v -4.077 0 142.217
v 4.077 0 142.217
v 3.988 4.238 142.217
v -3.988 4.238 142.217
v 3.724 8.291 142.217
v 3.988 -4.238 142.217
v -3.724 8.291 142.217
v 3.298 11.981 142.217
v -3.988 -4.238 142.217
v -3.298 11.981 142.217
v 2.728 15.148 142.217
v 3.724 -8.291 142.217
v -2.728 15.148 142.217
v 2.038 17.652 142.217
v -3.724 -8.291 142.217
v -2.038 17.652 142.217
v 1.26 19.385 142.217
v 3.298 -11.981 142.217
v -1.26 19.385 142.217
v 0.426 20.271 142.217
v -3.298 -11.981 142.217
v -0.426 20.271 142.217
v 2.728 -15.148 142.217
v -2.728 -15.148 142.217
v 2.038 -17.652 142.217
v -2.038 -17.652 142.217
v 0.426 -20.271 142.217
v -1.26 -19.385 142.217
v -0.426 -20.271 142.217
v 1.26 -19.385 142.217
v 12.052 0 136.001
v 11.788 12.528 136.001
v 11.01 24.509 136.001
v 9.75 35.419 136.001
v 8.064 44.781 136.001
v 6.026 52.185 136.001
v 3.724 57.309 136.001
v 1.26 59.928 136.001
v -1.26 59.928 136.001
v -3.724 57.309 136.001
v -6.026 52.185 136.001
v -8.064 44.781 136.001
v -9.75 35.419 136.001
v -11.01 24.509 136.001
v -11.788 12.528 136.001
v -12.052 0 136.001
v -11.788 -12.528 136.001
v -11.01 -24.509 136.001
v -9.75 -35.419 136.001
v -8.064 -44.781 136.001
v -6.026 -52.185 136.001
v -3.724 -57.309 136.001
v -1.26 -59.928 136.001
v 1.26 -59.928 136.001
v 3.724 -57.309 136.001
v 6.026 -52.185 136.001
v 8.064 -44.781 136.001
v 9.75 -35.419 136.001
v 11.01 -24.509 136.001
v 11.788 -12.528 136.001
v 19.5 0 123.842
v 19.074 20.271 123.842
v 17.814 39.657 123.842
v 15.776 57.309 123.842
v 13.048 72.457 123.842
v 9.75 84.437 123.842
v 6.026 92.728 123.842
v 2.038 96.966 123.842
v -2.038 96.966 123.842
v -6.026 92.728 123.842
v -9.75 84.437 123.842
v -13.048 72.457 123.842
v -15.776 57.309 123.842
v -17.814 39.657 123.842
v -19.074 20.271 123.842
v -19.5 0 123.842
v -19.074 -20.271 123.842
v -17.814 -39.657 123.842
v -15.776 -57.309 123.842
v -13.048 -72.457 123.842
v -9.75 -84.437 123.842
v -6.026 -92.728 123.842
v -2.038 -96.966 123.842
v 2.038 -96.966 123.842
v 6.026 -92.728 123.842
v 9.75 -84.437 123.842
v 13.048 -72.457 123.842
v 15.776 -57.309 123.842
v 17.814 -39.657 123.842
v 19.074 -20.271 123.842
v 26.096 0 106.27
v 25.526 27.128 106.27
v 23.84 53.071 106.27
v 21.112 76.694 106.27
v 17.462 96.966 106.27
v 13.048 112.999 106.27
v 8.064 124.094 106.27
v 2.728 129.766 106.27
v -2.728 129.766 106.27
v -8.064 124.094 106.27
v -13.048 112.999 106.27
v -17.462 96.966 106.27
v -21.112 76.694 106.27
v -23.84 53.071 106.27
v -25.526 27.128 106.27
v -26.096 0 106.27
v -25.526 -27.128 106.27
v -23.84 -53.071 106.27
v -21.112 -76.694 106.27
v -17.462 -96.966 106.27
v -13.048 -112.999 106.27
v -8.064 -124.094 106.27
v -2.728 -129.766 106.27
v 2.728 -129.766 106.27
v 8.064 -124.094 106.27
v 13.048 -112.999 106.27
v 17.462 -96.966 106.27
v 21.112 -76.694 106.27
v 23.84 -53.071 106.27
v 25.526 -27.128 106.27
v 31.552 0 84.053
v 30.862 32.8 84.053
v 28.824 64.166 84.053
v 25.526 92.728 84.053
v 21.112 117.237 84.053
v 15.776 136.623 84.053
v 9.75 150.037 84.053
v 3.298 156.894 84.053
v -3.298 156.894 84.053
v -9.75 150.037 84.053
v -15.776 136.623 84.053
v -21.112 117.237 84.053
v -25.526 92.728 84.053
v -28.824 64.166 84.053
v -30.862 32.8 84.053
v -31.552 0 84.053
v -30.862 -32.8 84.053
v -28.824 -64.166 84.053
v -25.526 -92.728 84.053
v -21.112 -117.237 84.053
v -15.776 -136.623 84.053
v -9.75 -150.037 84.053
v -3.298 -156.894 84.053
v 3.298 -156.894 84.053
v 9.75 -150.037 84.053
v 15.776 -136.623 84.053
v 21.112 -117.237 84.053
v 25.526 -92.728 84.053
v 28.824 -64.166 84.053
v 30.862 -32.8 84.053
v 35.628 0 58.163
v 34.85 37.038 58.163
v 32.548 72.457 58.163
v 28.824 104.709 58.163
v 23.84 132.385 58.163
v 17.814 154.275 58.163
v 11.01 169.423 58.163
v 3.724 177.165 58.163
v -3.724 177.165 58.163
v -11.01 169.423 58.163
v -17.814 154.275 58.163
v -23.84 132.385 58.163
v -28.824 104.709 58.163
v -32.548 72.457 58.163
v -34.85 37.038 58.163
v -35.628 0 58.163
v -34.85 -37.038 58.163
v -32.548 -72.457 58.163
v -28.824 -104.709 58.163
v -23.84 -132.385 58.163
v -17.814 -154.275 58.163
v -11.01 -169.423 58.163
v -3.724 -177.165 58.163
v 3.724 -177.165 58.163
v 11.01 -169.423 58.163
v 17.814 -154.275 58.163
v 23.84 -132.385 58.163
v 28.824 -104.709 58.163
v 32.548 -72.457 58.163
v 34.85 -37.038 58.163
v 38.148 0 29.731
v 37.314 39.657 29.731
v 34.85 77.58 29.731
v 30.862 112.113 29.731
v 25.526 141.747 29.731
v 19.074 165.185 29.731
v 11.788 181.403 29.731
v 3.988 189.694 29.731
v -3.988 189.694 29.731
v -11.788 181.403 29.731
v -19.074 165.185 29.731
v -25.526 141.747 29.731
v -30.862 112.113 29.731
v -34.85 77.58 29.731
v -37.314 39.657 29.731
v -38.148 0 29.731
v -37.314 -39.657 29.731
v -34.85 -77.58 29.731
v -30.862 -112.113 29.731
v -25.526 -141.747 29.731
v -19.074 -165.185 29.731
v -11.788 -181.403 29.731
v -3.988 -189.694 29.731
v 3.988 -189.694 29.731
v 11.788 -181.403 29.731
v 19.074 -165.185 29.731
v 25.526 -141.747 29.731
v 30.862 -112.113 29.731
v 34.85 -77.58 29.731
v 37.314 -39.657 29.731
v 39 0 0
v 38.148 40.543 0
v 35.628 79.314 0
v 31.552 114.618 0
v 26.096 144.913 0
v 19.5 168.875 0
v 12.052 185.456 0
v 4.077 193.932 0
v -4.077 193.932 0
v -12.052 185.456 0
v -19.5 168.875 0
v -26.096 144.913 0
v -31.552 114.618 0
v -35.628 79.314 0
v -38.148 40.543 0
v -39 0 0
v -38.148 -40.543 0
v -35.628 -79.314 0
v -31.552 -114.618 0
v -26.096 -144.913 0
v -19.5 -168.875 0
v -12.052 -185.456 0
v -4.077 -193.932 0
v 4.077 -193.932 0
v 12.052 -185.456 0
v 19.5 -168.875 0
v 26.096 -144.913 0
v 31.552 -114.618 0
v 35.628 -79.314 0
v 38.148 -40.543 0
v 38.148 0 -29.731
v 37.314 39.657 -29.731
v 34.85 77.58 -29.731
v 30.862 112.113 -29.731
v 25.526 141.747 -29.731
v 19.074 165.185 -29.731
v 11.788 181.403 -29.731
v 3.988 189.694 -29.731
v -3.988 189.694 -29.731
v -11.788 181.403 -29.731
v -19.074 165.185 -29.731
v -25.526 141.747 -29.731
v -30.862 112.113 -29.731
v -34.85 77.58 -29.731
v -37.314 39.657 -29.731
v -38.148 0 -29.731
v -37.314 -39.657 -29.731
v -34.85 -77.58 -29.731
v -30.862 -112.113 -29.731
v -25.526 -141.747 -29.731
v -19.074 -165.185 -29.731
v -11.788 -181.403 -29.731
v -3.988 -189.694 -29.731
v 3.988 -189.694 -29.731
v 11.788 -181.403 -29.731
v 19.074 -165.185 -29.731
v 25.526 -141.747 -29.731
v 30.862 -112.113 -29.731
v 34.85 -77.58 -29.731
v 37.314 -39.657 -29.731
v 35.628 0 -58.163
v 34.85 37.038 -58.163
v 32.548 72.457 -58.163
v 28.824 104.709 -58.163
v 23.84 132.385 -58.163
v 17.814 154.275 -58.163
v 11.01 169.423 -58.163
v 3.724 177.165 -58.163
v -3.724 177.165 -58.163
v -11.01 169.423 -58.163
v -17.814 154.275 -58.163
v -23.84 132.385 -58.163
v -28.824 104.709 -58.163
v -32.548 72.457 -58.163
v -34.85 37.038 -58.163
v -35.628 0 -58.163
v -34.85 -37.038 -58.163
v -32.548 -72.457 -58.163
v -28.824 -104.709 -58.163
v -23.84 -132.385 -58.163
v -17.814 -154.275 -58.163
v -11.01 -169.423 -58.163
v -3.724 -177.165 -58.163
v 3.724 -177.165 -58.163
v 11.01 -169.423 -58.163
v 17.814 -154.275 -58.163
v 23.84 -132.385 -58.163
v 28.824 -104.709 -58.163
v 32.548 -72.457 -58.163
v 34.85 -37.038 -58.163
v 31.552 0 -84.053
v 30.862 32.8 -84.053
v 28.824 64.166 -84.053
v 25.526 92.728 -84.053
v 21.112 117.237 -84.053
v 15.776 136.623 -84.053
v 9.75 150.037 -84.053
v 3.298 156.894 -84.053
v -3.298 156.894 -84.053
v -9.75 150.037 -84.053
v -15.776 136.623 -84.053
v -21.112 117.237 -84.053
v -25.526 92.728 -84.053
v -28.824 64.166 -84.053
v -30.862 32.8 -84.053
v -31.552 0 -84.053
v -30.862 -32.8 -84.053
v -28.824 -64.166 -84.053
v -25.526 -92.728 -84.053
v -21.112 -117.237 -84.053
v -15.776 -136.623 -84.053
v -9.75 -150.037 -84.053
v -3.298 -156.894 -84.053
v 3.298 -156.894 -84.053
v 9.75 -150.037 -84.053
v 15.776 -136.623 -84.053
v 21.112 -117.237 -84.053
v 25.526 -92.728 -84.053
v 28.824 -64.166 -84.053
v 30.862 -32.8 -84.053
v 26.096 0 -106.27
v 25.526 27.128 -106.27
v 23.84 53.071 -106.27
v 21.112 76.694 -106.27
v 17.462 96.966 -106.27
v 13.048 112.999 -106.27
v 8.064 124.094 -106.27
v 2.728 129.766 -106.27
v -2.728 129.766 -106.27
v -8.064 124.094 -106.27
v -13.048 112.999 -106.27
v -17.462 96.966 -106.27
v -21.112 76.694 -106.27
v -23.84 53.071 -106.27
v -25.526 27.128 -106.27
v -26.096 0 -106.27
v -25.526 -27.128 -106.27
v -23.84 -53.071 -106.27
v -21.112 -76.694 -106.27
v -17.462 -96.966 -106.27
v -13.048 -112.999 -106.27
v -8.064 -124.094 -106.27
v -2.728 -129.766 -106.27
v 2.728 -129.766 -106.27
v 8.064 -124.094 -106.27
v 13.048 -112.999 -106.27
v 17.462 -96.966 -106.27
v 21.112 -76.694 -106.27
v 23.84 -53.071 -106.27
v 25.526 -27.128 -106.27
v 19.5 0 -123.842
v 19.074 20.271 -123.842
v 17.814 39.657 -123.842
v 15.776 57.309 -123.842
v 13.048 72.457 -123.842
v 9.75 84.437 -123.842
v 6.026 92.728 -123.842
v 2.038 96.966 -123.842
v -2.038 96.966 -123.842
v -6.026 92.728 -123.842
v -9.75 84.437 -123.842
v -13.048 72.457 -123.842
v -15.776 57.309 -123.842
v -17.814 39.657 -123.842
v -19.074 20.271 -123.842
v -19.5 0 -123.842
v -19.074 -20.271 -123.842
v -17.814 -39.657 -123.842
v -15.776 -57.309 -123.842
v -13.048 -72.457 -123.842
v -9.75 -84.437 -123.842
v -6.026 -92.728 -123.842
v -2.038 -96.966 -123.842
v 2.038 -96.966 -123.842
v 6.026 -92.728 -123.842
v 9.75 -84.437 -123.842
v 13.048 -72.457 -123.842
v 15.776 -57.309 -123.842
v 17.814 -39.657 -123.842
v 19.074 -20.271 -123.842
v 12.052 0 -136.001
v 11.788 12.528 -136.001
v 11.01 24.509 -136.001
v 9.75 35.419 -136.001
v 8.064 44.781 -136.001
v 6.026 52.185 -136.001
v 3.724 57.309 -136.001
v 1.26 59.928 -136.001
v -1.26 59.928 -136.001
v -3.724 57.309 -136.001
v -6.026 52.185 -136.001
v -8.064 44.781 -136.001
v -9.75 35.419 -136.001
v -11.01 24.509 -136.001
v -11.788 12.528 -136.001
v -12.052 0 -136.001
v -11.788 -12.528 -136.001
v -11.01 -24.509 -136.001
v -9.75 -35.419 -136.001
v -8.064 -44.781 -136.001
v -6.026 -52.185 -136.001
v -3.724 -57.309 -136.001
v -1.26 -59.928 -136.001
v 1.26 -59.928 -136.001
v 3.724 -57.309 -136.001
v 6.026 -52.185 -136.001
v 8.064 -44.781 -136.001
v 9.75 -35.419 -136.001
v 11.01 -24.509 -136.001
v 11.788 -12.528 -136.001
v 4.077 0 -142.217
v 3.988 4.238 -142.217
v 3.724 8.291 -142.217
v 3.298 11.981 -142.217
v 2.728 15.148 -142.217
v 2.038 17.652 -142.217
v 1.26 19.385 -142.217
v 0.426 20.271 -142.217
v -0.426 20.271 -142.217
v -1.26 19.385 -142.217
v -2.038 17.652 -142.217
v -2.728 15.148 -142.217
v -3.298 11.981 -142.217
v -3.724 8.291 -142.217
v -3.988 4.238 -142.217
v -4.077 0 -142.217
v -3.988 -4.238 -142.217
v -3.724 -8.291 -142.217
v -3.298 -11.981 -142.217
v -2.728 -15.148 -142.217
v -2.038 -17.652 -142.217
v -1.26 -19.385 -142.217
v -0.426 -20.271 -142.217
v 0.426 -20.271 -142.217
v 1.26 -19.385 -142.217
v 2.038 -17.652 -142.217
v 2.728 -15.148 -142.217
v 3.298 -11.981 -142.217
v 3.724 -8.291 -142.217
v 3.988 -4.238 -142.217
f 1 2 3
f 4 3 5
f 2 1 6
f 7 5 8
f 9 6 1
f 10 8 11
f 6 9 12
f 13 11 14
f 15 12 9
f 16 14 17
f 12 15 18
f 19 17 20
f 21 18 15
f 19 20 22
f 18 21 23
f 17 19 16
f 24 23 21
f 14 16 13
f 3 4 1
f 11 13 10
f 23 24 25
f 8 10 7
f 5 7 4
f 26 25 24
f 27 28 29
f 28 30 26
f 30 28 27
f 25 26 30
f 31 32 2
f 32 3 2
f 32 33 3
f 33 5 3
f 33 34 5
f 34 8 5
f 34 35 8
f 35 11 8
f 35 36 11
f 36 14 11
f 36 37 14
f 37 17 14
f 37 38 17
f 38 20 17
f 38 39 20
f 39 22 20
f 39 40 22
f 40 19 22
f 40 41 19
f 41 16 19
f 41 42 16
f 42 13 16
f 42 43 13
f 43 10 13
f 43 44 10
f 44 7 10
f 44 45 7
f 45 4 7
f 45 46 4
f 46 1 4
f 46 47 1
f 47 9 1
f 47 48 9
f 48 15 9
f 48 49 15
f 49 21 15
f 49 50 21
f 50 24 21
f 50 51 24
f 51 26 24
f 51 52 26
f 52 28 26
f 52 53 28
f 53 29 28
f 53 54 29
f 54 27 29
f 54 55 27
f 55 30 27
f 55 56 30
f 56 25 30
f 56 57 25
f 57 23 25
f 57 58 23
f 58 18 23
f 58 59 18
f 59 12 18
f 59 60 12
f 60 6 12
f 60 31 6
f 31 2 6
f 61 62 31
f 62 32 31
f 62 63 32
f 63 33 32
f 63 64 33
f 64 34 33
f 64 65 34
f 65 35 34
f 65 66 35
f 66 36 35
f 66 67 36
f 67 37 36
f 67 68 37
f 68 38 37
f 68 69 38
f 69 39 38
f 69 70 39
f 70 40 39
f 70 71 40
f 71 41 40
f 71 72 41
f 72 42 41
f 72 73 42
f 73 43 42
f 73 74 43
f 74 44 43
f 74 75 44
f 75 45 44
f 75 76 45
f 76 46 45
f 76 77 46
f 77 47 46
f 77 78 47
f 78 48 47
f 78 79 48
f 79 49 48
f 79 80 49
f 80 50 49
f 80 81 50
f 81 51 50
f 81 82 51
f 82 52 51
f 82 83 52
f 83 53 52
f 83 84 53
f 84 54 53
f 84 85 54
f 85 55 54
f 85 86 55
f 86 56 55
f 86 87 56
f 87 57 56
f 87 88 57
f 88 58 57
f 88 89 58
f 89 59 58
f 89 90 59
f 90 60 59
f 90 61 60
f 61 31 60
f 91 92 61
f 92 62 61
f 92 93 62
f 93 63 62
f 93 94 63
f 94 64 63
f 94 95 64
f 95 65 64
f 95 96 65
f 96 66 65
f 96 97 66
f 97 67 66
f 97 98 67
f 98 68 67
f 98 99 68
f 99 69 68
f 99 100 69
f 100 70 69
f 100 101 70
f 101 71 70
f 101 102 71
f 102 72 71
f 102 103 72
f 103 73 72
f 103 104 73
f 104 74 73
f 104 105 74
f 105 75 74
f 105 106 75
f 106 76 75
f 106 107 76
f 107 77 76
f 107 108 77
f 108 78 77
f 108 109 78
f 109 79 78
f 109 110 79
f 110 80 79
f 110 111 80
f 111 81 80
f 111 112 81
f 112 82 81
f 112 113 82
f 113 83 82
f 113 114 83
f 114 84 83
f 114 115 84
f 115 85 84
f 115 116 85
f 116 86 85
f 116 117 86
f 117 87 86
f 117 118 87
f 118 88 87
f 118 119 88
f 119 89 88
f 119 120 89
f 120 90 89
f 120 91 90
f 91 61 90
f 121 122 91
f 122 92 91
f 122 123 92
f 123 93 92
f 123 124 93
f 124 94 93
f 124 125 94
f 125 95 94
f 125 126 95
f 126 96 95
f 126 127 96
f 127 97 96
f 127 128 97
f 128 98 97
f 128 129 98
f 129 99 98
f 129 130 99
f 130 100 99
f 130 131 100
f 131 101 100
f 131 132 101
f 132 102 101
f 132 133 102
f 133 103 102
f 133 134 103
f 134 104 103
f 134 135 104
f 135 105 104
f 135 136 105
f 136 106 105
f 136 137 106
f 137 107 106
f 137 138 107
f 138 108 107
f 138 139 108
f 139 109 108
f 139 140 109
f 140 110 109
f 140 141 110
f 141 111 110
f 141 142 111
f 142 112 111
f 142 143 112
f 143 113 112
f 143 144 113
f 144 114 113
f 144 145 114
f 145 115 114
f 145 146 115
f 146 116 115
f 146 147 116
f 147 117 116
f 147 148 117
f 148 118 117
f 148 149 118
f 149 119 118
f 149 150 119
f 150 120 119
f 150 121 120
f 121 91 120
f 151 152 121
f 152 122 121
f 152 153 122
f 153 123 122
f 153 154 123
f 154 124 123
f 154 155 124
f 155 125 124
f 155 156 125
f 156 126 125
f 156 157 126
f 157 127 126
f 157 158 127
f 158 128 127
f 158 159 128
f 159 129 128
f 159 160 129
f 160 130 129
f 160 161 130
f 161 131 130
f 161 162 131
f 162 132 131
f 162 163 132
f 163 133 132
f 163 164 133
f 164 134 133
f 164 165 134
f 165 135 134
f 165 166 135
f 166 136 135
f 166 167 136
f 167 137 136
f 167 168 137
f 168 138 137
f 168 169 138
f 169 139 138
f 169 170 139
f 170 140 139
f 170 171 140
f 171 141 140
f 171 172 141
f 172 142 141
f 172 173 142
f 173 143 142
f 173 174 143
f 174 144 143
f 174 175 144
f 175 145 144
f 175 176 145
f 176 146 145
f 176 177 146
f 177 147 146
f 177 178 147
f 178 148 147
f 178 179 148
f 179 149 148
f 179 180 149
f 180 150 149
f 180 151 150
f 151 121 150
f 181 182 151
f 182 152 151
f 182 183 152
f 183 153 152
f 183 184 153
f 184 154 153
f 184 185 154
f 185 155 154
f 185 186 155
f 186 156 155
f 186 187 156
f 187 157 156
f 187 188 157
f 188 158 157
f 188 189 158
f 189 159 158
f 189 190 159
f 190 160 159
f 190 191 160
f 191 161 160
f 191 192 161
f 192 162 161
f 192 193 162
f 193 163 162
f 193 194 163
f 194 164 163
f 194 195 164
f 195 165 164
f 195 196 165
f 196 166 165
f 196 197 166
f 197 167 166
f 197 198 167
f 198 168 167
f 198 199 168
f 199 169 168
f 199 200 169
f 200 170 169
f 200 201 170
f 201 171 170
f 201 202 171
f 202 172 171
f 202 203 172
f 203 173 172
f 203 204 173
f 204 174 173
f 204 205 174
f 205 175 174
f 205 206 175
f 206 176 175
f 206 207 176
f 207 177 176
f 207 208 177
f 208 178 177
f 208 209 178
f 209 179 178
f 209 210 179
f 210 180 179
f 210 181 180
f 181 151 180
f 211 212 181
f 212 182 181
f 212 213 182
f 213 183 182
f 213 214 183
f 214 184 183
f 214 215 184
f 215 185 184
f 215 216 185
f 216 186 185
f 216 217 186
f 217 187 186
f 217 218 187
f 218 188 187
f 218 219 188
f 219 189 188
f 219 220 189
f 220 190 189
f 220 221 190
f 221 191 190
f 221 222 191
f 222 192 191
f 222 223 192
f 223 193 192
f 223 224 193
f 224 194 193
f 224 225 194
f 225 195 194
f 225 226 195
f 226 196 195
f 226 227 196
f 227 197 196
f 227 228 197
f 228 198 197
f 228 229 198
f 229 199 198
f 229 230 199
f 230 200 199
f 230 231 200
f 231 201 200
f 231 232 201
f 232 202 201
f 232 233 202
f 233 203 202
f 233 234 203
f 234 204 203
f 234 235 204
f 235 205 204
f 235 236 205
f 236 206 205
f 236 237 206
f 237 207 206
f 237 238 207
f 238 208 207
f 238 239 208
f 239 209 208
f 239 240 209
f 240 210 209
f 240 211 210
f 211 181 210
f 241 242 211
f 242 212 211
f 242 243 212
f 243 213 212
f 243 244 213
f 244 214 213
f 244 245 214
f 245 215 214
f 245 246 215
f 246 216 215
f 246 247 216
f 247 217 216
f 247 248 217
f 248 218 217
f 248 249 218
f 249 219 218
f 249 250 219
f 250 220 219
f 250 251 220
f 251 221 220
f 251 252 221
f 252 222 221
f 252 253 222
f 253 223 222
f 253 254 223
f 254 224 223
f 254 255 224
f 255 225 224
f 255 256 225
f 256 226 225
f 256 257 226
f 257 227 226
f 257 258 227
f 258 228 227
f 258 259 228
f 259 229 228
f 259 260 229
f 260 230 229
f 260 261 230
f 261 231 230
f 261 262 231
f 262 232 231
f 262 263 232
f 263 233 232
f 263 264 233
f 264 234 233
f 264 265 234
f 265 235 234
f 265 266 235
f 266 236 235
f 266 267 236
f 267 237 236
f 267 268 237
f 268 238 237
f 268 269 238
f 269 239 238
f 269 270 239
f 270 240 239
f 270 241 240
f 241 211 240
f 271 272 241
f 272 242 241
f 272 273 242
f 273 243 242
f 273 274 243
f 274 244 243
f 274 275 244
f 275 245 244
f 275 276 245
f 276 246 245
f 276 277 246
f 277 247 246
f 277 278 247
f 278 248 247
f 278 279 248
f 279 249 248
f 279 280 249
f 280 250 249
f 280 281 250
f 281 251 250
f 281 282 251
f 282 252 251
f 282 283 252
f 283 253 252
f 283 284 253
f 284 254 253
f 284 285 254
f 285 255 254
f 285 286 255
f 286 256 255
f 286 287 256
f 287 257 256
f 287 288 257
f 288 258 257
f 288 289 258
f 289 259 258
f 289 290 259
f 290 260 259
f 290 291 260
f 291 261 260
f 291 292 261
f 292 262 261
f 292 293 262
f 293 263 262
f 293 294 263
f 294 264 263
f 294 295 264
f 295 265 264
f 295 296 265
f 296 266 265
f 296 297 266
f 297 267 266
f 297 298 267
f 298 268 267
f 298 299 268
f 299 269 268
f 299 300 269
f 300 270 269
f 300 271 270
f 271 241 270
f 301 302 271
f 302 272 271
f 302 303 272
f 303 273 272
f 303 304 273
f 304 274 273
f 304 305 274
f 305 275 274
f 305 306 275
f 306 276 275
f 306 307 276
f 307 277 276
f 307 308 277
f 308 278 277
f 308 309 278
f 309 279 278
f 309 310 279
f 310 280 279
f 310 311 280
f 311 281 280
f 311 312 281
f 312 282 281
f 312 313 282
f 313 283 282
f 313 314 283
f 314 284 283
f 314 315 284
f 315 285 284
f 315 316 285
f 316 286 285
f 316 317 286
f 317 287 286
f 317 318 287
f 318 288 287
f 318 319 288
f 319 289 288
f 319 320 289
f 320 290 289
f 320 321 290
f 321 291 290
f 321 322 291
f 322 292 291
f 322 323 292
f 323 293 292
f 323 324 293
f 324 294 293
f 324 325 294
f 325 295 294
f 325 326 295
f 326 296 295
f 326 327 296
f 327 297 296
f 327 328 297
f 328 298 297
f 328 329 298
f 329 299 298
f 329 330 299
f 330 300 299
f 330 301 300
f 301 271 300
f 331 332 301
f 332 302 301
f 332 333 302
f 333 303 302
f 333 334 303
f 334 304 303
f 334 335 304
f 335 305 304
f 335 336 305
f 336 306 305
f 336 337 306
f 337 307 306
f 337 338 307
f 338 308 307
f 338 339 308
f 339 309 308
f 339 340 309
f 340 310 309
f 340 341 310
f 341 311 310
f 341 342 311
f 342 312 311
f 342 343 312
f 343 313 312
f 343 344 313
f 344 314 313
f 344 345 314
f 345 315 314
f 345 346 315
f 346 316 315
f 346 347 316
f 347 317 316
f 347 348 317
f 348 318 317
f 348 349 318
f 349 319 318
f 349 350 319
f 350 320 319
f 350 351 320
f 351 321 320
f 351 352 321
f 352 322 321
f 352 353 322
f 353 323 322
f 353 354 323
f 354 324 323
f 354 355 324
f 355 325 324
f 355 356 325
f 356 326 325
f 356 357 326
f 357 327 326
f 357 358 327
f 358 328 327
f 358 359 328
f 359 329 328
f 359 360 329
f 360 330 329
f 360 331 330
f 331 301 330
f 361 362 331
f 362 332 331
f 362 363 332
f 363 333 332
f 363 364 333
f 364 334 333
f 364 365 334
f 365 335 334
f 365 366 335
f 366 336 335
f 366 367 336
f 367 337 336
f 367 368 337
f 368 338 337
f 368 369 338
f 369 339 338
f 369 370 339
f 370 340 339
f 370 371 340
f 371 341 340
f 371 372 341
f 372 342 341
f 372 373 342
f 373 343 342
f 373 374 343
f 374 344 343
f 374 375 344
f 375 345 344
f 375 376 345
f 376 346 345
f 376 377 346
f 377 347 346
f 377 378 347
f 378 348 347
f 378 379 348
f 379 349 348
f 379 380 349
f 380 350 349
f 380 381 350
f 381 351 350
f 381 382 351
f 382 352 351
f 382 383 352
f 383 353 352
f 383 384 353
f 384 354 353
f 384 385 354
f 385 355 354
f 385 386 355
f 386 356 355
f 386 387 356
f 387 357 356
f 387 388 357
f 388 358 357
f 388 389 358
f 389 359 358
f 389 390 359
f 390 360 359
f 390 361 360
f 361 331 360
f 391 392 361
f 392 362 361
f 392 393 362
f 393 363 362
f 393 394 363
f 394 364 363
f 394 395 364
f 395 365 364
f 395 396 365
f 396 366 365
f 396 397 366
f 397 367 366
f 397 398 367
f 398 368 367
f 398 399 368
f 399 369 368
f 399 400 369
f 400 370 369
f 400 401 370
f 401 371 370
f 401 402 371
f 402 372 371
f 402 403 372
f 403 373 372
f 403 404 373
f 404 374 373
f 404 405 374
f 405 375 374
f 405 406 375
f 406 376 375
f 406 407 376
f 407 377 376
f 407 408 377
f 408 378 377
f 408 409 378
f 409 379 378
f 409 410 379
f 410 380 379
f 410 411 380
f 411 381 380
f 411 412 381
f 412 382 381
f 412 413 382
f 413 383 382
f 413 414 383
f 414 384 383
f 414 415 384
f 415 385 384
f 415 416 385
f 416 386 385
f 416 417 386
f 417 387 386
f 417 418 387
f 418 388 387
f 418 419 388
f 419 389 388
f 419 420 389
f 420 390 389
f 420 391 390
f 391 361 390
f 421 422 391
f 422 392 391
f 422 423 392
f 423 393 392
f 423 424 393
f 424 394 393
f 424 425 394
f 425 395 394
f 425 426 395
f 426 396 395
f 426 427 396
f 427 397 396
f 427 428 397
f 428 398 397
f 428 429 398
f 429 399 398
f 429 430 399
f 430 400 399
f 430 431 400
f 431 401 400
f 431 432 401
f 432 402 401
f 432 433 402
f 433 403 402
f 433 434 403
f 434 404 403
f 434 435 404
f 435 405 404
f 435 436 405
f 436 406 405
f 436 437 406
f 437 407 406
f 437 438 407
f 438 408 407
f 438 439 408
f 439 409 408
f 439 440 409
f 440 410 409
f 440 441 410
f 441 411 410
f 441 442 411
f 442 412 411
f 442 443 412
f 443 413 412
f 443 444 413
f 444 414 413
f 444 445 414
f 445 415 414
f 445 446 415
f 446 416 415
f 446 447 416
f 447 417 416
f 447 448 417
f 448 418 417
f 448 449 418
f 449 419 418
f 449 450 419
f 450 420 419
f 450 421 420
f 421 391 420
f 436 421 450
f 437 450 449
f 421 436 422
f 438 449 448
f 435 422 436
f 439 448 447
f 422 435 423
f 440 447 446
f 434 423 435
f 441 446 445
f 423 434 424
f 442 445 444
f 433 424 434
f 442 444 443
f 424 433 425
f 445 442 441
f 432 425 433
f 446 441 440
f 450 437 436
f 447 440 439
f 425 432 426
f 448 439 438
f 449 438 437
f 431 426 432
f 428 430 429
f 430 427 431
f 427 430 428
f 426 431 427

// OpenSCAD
// Generated by SolidPython 1.0.1 on 2020-07-29 00:46:45


scale(v = [3, 15, 11]) {
	sphere(r = 13);
}
/***********************************************
*********      SolidPython code:      **********
************************************************
 
# import packages: SolidPython
from solid import *
from solid.utils import *
from itertools import chain, combinations, permutations


class Resize:

    def __init__(self, scad_file):
        self.scad_file = scad_file
        #self.scad_file = import_scad(scad_file)
        # cone/cylinder param:
        self.r1 = 0
        self.r2 = 0
        self.h = 0
        # rectangular prism param:
        self.w = 0
        self.l = 0
        # ellipse param:
        self.r = 0

    # import OpenScad code (file name corresponds to shape)


    # classify shape + parameters
    def assign(self, param1, param2, param3):
        if self.scad_file == 'cone.scad':
            self.r1 = param1
            self.r2 = param2
            self.h = param3
        elif self.scad_file == 'cylinder.scad':
            self.r1 = param1
            self.r2 = param2
            self.h = param3
        elif self.scad_file == 'rectangularPrism.scad':
            self.h = param1
            self.l = param2
            self.w = param3
        else:
            self.r = param1
            self.h = param2

    # resize parameters
    def iterate(self):
        x = range(3, 20, 2)
        i = 1
        if self.scad_file == 'cone.scad':
            tempList = list(permutations(x, 2))
            for temp in tempList:
                param1 = temp[0]
                param2 = temp[1]
                filepath = 'produced_scad_files/' + 'cone' + str(param1) + '_' + str(param2) + '_' + '.scad'
                scad_render_to_file(cylinder(h=param1, r1=param2, r2=0), filepath)

        elif self.scad_file == 'cylinder.scad':
            tempList = list(permutations(x, 3))
            for temp in tempList:
                param1 = temp[0]
                param2 = temp[1]
                filepath = 'produced_scad_files/' + 'cylinder' + str(param1) + '_' + str(param2) + '_' + '.scad'
                scad_render_to_file(cylinder(h=param1, r1=param2, r2=param2), filepath)

        elif self.scad_file == 'rectangularPrism.scad':
            tempList = list(permutations(x, 3))
            for temp in tempList:
                param1 = temp[0]
                param2 = temp[1]
                param3 = temp[2]
                filepath = 'produced_scad_files/' + 'rectangularPrism' + str(param1) + '_' + str(param2) + '_' + str(
                    param3) + '.scad'
                scad_render_to_file(cube(size=(param1, param2, param3)), filepath)

        elif self.scad_file == 'ellipse.scad':
            tempList = list(permutations(x, 4))
            for temp in tempList:
                param1 = temp[0]
                param2 = temp[1]
                param3 = temp[2]
                param4 = temp[3]
                filepath = 'produced_scad_files/' + 'ellipse' + str(param1) + '_' + str(param2) + '_' + str(param3) + '_' + str(param4) + '.scad'
                scad_render_to_file(scale([param1, param2, param3])(sphere(r=param4)), filepath)

    def render_to_scadfile(self):
        scad_render_to_file(scad, 'example.scad') 
 
************************************************/
